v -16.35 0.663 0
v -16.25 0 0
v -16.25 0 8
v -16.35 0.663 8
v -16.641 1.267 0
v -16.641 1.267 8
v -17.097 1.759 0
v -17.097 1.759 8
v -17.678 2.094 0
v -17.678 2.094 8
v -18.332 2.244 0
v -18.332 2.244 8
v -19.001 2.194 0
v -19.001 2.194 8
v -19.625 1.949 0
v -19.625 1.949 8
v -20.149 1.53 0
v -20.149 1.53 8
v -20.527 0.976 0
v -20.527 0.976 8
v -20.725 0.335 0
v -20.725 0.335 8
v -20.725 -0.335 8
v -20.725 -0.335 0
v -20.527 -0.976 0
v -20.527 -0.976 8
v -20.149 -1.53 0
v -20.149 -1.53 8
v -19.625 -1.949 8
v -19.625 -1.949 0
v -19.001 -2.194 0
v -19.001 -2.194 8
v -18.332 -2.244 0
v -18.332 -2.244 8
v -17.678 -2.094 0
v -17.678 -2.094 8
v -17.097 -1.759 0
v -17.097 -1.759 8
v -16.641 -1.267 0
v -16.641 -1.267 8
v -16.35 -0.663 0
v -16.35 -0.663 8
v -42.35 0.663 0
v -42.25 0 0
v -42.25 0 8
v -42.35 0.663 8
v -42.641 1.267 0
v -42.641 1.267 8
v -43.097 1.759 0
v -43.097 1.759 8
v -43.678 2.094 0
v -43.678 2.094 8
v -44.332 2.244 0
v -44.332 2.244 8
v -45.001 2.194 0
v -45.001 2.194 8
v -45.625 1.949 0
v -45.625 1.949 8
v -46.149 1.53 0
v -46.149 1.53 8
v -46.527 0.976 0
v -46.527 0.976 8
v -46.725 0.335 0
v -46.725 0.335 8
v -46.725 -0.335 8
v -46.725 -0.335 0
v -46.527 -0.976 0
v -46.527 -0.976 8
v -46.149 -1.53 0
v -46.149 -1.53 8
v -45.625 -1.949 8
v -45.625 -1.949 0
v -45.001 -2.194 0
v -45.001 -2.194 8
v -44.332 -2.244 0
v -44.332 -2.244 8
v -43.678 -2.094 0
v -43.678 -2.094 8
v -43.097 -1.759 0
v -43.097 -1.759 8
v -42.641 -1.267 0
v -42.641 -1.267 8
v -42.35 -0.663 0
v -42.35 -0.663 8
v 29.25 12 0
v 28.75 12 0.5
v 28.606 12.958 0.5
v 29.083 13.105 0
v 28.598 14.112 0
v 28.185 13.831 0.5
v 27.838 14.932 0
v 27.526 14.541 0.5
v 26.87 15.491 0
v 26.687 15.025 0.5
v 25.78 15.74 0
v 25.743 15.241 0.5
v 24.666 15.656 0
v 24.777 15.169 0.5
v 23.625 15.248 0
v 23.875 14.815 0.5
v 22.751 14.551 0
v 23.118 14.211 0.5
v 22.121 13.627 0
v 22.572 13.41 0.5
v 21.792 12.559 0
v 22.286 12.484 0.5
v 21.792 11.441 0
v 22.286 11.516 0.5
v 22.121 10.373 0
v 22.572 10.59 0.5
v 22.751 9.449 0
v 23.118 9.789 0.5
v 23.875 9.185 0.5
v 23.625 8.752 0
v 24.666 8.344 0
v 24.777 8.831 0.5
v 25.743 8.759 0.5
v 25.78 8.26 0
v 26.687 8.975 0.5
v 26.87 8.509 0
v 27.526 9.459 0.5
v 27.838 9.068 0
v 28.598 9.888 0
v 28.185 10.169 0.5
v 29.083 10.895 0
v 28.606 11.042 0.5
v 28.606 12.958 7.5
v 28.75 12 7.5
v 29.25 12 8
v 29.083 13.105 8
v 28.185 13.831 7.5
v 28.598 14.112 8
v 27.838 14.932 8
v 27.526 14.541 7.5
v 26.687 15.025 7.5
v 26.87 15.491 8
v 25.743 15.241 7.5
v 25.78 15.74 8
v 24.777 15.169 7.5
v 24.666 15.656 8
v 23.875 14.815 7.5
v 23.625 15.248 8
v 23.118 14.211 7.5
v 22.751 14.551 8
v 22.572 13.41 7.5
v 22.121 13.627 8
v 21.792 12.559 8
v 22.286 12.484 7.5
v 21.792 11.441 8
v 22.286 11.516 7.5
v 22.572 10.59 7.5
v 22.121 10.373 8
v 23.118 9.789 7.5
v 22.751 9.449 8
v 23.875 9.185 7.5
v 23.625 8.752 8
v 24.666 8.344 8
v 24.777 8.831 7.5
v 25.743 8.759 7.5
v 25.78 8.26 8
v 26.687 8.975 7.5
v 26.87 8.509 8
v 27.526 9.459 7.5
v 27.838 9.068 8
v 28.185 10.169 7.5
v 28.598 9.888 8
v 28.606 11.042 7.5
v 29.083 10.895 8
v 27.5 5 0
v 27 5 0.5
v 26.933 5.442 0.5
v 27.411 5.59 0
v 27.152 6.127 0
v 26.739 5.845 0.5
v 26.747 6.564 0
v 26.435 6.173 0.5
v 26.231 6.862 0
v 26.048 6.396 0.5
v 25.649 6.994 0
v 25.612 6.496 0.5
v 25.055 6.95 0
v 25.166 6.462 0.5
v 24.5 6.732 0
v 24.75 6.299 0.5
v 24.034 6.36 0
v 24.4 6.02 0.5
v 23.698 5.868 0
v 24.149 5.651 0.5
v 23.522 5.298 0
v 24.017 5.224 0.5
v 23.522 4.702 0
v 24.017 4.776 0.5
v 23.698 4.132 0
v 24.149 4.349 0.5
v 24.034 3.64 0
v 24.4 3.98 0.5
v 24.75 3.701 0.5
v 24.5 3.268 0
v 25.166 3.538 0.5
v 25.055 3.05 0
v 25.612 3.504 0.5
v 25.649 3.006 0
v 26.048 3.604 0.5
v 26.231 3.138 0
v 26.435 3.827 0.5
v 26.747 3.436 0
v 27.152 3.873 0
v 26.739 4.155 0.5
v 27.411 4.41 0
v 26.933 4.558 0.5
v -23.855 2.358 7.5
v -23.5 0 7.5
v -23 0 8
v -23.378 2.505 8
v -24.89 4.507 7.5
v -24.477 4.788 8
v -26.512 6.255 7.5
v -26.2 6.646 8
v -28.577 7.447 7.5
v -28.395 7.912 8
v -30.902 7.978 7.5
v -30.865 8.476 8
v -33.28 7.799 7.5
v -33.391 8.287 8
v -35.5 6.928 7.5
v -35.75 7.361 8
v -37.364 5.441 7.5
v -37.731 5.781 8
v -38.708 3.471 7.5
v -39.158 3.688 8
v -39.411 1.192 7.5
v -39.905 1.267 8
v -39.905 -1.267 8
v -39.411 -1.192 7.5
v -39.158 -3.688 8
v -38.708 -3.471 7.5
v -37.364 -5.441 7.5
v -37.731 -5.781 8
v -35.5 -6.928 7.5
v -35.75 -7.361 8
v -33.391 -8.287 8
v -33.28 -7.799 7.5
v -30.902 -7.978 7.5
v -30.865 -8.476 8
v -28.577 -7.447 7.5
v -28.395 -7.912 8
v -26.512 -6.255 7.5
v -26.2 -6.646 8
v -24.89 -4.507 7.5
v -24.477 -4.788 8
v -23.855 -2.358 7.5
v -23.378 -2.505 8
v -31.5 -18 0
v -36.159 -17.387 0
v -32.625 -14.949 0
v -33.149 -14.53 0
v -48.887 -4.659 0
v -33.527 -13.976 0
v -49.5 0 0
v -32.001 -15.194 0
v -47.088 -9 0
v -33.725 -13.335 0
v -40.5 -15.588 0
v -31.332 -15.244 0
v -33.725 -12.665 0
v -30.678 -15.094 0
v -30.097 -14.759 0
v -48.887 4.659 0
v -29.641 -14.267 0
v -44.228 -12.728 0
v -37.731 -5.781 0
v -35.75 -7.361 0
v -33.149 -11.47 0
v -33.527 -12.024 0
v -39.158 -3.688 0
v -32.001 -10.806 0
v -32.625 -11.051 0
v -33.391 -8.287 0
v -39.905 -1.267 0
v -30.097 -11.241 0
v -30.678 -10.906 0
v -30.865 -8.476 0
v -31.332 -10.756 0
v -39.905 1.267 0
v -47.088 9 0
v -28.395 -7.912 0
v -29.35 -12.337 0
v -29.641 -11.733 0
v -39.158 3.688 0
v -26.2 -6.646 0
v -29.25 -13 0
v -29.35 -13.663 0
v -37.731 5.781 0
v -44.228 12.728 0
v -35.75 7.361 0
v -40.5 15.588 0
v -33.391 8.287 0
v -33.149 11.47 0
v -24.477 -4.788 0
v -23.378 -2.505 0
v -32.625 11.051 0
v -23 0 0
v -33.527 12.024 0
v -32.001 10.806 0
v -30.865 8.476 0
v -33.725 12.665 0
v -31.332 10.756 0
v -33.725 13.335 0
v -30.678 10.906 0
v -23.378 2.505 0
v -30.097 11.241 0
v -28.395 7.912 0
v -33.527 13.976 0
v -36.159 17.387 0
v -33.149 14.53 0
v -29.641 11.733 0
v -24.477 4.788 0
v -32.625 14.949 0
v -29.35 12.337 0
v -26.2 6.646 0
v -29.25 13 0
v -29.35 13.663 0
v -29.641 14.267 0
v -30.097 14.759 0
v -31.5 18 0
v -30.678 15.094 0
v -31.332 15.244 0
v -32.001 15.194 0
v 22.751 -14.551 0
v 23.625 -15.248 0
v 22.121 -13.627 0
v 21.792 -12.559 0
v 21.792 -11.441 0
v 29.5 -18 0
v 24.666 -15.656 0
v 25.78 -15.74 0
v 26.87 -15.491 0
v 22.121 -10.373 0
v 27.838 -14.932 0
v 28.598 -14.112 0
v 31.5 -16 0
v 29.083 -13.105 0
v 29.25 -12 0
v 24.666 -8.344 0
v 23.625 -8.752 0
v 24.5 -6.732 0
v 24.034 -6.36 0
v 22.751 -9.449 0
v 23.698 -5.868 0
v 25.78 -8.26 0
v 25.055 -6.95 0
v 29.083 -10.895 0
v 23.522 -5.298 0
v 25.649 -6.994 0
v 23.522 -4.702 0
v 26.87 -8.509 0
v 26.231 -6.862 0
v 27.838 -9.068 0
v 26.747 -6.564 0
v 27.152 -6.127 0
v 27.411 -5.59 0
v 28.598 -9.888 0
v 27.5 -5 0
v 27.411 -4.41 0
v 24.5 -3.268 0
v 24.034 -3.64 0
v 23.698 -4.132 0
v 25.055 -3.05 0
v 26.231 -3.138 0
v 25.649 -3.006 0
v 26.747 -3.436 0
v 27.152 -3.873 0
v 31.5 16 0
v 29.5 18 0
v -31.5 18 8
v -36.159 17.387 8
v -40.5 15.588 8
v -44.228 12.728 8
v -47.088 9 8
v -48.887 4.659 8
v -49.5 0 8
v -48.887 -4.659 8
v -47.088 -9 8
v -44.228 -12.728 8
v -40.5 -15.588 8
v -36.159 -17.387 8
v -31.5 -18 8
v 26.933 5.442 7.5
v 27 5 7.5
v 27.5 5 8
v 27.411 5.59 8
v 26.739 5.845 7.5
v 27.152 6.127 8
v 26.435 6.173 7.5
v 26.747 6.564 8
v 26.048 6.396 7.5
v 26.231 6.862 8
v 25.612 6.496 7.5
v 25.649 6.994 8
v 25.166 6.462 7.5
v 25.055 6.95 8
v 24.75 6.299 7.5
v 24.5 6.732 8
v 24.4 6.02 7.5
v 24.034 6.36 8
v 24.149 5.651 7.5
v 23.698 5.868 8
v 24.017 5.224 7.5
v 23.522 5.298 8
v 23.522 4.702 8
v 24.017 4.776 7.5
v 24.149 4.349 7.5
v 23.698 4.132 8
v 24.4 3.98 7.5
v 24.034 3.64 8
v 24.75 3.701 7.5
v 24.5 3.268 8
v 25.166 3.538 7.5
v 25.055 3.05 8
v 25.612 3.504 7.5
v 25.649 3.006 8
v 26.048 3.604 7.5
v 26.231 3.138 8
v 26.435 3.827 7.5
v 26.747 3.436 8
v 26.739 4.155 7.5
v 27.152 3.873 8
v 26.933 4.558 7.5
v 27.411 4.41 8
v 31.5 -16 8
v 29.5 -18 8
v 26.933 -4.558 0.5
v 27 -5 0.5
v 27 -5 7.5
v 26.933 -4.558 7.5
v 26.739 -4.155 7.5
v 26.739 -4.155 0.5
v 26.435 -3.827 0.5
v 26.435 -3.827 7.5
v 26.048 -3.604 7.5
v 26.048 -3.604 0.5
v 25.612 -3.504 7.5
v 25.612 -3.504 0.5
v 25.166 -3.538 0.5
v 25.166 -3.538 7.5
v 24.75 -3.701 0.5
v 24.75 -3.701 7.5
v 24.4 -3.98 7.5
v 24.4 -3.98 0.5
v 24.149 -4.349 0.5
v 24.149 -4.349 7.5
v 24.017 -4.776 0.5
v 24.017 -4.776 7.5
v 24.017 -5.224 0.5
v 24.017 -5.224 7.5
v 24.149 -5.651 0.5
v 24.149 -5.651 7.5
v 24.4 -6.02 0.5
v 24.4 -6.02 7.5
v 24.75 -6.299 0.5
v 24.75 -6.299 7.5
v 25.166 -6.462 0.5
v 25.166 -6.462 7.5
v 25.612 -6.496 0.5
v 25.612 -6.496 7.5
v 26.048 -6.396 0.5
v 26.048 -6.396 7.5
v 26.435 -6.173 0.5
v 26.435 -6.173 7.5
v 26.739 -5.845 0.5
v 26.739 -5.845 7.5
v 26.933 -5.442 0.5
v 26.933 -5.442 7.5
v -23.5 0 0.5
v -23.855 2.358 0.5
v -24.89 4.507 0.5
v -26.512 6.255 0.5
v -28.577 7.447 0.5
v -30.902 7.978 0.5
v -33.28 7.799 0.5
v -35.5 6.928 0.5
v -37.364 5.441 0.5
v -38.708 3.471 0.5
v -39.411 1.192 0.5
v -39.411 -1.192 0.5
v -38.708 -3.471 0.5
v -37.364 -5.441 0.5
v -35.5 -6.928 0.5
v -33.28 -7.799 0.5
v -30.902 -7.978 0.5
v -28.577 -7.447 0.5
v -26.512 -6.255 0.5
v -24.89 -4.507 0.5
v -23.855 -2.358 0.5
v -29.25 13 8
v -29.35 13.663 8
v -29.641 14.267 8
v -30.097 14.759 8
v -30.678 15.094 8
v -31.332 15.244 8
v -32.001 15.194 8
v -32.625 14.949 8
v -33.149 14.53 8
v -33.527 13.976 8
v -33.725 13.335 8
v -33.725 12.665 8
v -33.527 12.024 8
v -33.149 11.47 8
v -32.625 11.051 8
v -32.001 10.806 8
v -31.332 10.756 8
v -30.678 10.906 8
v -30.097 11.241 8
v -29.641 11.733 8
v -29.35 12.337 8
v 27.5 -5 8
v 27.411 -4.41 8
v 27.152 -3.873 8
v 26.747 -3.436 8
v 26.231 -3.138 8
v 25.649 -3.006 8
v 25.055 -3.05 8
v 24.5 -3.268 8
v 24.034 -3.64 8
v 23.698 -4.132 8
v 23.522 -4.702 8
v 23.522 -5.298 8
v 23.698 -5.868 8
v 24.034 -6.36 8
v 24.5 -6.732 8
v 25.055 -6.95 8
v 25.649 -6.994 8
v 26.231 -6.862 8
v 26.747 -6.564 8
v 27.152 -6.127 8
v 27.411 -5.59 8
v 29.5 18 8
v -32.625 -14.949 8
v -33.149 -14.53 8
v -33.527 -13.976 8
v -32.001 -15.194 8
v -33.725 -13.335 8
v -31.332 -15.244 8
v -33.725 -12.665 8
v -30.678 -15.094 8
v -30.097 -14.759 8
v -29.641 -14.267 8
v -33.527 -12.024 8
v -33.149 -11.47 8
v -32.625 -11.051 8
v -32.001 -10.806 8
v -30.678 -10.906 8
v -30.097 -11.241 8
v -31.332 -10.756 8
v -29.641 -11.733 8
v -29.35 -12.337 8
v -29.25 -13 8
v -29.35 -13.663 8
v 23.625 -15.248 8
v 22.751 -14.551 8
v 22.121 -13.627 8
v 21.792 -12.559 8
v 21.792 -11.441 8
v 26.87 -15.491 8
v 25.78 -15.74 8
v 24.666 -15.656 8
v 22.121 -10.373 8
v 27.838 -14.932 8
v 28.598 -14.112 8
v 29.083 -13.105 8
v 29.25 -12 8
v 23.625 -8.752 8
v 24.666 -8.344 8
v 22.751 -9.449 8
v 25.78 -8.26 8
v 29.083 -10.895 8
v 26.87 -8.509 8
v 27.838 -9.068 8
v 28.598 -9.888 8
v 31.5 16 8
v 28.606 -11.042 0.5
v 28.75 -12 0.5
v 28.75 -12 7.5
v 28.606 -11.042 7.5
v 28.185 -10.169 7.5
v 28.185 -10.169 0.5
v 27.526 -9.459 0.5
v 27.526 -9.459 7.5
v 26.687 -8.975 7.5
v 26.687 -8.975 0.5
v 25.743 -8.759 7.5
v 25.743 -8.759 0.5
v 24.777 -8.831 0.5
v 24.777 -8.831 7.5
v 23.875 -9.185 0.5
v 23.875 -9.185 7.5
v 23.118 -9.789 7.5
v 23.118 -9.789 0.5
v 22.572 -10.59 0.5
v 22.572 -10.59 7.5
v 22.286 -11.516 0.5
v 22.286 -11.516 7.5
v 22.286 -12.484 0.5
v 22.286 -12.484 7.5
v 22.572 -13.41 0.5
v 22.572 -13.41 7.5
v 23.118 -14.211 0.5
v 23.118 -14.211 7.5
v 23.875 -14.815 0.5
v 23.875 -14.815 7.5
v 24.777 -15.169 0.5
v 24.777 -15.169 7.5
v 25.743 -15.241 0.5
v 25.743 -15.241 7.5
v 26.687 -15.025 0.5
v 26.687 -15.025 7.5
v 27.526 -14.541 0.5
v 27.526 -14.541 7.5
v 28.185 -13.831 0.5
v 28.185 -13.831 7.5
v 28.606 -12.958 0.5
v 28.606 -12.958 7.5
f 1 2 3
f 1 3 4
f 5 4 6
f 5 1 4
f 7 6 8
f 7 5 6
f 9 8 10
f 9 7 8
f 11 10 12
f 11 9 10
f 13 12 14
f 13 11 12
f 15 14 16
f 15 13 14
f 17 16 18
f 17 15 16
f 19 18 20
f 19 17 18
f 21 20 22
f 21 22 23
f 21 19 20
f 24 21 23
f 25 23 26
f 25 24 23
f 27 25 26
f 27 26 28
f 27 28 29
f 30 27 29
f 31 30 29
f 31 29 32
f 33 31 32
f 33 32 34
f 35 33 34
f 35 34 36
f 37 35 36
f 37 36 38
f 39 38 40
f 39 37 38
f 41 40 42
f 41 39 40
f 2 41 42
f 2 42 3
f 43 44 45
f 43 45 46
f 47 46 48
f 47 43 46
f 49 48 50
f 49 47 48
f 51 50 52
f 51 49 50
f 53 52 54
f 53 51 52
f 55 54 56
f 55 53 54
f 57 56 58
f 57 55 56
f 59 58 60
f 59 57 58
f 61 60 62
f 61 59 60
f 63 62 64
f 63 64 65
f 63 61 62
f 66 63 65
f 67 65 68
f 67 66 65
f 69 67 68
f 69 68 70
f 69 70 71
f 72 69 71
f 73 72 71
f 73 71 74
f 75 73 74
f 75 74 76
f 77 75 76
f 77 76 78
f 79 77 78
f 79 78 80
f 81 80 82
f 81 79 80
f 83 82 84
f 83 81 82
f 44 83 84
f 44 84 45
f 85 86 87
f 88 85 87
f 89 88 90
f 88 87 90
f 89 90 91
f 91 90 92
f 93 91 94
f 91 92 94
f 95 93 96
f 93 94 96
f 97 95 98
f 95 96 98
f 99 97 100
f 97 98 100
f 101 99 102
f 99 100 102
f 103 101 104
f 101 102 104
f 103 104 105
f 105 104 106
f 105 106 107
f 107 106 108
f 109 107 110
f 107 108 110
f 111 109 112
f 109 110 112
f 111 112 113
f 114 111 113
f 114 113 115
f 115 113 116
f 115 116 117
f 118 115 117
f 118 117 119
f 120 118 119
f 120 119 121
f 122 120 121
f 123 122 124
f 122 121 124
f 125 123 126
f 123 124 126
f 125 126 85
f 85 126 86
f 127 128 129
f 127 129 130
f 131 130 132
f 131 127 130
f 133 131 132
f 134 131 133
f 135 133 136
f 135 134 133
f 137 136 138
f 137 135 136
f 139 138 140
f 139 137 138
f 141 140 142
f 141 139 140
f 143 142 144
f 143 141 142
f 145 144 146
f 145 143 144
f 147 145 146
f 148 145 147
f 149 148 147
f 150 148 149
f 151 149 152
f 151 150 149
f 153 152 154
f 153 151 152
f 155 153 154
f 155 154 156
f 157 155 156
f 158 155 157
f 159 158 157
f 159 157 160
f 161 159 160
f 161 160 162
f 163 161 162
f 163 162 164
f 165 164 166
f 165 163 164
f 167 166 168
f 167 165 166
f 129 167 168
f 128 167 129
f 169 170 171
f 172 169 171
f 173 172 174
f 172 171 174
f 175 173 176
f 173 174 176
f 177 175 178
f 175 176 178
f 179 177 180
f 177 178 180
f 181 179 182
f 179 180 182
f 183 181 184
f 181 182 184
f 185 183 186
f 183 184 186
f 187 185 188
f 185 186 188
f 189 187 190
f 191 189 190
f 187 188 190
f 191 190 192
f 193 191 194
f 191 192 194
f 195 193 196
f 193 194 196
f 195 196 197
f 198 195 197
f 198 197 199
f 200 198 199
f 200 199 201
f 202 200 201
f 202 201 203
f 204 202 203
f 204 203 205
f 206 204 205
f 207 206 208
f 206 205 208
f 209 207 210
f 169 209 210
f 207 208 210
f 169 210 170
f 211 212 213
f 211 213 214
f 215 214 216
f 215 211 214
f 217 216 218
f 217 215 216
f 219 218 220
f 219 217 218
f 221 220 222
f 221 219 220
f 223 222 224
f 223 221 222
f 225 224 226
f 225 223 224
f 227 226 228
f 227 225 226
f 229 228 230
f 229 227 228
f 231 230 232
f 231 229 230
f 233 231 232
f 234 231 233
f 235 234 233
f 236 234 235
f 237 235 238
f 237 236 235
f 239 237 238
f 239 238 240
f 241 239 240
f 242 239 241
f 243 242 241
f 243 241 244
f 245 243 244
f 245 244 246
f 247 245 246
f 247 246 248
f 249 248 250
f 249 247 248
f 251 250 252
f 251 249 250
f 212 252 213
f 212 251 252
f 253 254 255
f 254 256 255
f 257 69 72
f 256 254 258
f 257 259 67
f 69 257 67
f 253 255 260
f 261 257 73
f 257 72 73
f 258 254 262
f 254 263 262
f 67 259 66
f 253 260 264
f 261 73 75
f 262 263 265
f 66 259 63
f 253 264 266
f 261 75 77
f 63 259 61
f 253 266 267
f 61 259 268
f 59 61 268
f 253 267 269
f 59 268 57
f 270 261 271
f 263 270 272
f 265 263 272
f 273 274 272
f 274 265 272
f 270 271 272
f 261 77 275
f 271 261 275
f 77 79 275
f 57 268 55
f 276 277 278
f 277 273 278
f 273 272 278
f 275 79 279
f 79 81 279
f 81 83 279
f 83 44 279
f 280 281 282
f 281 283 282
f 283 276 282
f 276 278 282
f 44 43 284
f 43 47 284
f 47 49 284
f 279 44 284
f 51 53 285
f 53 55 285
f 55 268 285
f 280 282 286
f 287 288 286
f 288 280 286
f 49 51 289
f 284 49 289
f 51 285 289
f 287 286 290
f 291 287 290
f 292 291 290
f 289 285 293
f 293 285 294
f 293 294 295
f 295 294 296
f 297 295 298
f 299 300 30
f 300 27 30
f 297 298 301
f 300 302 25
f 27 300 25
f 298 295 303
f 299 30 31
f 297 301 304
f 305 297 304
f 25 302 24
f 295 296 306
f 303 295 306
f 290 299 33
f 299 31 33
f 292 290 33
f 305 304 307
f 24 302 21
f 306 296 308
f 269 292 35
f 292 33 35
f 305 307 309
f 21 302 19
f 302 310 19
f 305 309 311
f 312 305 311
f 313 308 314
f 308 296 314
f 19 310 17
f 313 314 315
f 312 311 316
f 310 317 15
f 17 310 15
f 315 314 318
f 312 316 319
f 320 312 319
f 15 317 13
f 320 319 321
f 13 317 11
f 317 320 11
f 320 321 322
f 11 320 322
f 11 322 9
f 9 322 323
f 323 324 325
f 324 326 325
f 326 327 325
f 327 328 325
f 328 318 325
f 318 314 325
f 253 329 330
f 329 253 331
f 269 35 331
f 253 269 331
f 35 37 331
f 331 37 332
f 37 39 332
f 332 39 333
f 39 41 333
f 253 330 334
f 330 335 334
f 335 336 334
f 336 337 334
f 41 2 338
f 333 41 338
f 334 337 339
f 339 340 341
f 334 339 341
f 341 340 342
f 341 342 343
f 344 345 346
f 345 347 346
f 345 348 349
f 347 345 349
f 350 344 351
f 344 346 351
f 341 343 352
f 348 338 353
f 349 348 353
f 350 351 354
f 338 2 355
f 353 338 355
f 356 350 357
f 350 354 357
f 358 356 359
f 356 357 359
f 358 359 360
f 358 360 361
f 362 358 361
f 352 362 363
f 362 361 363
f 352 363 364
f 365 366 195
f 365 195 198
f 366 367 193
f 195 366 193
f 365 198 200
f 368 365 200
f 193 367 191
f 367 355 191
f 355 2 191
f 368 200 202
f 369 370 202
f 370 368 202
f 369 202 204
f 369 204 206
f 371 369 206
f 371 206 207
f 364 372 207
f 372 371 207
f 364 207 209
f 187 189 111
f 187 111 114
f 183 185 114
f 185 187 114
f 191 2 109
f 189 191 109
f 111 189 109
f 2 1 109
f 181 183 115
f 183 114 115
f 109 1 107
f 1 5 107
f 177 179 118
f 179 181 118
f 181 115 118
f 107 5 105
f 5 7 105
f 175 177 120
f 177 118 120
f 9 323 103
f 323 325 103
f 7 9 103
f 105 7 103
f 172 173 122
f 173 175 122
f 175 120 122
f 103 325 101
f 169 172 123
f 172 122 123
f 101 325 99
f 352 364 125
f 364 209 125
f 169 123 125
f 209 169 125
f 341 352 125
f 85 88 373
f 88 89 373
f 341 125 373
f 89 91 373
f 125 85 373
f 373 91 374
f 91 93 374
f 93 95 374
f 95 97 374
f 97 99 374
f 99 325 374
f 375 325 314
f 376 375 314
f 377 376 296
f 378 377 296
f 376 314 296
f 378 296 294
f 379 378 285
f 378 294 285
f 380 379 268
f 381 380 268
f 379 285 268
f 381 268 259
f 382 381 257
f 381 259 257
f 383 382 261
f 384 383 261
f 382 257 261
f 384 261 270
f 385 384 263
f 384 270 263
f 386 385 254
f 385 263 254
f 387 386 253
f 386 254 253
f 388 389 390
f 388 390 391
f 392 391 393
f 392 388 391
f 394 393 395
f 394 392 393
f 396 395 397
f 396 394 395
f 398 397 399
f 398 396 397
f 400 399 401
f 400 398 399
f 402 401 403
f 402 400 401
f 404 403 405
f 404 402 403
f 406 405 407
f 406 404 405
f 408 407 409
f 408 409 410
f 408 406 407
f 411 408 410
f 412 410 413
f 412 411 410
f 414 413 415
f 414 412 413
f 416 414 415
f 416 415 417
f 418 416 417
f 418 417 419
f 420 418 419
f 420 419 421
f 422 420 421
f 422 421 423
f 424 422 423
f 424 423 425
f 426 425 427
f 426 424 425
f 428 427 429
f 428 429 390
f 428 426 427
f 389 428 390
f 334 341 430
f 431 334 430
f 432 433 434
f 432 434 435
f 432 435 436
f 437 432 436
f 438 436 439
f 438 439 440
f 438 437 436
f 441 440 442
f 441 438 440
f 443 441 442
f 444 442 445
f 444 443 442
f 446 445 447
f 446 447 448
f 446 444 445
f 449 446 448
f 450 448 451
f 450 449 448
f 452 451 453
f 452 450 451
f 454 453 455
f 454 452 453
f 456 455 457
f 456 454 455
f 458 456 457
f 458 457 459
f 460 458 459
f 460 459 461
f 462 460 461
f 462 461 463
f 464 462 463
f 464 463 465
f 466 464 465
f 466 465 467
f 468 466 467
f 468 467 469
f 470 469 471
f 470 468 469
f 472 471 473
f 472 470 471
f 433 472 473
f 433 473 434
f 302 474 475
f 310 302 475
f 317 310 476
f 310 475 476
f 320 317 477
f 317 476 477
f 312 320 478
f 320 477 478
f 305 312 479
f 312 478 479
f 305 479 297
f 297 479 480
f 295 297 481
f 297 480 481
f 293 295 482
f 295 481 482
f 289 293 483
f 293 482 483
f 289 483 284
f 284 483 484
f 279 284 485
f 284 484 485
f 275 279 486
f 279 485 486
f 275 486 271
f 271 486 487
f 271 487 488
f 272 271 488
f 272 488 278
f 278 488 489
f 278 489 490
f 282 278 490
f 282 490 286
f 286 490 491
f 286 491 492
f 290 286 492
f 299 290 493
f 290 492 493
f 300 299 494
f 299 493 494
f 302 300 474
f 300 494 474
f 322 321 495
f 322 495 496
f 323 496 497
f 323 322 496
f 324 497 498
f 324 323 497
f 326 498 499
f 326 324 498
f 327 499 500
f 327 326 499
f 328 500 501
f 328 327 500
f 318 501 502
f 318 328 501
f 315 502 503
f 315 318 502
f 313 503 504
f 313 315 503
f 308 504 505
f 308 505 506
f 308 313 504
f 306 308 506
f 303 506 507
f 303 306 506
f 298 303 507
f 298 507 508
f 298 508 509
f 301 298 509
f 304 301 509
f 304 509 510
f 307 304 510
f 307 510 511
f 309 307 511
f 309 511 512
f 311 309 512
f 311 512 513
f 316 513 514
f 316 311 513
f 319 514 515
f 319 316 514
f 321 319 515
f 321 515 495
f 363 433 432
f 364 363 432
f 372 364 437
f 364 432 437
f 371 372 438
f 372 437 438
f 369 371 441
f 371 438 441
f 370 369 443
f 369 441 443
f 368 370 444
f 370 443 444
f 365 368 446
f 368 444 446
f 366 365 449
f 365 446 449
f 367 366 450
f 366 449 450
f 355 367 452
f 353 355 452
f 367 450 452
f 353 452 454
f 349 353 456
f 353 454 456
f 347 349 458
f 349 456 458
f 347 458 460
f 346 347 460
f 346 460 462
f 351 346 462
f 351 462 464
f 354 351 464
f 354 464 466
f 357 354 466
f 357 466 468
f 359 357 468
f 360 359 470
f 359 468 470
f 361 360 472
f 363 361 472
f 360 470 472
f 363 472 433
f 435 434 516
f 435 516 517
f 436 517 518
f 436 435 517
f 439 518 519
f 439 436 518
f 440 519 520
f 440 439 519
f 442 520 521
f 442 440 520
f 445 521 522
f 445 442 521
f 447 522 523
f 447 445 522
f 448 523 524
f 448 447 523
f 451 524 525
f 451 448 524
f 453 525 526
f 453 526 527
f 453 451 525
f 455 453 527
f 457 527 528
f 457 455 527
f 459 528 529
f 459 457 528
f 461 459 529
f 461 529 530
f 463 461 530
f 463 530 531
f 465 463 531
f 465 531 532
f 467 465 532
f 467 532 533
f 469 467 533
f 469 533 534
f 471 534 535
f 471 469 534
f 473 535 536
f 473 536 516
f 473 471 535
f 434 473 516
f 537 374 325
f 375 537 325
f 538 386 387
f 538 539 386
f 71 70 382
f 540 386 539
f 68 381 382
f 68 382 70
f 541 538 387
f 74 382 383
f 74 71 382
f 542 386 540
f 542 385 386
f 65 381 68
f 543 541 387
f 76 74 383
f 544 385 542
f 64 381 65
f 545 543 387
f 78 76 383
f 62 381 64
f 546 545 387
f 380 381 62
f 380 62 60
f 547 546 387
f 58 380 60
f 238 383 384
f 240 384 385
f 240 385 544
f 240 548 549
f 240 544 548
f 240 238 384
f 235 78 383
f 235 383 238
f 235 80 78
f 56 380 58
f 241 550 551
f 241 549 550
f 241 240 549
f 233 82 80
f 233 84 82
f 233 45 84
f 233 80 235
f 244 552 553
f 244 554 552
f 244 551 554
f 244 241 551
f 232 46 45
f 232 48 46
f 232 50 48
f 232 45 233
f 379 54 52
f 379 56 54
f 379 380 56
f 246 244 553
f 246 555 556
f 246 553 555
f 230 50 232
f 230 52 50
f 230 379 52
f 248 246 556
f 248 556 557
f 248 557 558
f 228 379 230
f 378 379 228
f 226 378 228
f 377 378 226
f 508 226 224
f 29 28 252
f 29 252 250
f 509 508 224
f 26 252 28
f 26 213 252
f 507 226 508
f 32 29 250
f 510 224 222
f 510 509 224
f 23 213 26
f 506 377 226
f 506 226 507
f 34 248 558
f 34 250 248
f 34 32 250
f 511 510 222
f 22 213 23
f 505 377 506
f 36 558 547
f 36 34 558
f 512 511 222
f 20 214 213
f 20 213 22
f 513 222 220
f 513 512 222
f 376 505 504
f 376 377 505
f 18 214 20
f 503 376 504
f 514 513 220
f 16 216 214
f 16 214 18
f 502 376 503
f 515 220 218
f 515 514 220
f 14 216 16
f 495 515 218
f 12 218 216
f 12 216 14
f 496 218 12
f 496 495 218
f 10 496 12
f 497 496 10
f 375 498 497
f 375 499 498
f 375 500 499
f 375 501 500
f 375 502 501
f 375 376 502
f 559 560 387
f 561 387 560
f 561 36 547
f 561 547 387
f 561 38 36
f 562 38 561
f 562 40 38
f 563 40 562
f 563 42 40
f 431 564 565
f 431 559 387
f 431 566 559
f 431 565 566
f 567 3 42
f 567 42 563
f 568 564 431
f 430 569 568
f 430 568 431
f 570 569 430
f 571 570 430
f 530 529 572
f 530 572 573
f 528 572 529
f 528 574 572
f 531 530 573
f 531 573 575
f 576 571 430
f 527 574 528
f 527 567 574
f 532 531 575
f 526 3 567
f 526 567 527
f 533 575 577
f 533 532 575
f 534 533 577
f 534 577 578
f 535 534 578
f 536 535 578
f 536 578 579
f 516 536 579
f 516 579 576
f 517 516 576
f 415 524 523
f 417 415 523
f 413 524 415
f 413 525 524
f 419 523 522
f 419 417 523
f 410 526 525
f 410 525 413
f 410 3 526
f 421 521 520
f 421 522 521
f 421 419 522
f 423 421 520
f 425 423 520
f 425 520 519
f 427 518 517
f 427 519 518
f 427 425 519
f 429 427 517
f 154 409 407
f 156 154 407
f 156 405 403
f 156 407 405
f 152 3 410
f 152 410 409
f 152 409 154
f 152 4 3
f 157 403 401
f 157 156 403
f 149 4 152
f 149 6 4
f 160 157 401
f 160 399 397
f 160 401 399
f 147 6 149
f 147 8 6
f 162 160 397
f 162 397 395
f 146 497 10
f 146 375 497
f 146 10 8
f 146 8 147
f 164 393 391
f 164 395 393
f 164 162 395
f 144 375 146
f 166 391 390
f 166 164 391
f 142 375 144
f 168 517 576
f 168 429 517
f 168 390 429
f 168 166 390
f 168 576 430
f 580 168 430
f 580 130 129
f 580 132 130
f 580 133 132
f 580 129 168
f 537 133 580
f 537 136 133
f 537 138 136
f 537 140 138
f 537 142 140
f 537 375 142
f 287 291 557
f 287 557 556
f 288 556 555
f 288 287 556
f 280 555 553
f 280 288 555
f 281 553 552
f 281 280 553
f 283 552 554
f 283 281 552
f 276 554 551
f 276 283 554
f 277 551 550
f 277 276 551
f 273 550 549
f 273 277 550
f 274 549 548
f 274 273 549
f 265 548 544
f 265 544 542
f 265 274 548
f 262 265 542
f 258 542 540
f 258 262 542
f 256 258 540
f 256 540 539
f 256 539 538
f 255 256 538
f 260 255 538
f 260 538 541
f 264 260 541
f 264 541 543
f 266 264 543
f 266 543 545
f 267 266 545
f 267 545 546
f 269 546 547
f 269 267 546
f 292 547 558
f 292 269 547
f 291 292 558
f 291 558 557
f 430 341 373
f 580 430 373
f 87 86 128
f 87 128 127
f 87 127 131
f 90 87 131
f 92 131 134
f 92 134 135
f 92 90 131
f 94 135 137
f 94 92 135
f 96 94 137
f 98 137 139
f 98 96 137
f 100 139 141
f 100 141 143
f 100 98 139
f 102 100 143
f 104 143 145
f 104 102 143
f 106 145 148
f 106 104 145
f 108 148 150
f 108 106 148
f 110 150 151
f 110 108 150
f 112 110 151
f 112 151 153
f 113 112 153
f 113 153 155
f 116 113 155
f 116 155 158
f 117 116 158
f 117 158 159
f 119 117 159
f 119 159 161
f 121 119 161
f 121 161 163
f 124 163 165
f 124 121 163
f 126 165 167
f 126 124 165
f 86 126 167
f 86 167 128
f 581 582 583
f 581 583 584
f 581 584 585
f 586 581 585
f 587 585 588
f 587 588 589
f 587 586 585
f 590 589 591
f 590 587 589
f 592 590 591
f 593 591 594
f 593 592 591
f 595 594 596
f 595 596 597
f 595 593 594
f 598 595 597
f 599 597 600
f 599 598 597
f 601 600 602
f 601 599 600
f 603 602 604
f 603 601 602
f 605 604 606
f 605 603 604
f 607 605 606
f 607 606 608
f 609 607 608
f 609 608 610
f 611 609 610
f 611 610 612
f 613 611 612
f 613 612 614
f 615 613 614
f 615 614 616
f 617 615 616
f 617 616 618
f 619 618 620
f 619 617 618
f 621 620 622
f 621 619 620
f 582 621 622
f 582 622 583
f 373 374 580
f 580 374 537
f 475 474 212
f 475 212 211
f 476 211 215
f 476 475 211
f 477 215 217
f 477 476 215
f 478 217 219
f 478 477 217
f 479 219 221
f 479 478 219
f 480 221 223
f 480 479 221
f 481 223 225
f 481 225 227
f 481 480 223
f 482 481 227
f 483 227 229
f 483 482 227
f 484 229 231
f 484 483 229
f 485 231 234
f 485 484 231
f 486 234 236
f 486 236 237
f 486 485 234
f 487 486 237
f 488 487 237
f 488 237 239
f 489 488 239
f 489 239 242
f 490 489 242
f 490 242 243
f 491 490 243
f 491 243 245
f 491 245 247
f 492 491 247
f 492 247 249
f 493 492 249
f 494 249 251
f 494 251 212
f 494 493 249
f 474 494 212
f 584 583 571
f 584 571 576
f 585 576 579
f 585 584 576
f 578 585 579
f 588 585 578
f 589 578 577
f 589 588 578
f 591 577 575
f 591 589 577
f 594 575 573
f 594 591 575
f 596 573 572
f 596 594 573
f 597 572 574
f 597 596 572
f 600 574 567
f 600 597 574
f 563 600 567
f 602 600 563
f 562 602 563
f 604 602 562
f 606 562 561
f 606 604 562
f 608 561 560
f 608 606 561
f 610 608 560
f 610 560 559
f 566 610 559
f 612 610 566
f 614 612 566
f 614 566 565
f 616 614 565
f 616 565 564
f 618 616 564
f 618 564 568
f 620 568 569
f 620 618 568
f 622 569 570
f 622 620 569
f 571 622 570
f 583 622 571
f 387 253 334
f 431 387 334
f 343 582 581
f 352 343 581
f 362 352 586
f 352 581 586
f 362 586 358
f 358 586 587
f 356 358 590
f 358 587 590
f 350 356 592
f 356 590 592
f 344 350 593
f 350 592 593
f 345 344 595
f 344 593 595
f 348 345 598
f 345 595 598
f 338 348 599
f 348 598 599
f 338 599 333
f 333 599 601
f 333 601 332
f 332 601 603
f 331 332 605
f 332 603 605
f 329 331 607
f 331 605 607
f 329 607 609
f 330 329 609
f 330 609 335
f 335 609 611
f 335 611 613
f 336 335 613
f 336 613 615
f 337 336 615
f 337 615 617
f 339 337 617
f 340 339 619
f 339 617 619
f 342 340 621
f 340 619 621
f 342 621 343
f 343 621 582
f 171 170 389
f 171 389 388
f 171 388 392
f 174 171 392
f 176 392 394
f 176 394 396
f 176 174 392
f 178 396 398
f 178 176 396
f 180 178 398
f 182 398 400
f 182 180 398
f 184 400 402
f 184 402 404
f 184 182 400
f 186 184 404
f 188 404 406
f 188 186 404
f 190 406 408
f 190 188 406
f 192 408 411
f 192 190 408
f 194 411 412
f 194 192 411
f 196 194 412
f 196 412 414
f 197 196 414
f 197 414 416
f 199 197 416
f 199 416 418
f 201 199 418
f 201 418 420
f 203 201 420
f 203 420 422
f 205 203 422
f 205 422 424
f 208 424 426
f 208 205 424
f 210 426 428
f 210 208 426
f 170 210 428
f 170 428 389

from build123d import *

# Parameters (mm, degrees)
SKETCH1_R           = 8
SKETCH1_R_2         = 2.25
SKETCH1_R_3         = 3.25
SKETCH1_R_4         = 1.5
BOSS_EXTRUDE1_DEPTH = 8
CHAMFER2_SIZE       = 2
CHAMFER3_SIZE       = 0.5


with BuildPart() as part:
    # Sketch1 → Boss-Extrude1 (new body)
    with BuildSketch(Plane.XY):
        with BuildLine():
            Line((-31.5, -18), (31.5, -18))
            Line((31.5, -18), (31.5, 18))
            Line((31.5, 18), (-31.5, 18))
            ThreePointArc((-31.5, 18), (-49.5, 0), (-31.5, -18))
        make_face()
        with Locations((-31.5, 0)):
            Circle(SKETCH1_R, mode=Mode.SUBTRACT)
        with Locations((-31.5, 13)):
            Circle(SKETCH1_R_2, mode=Mode.SUBTRACT)
        with Locations((-18.5, 0)):
            Circle(SKETCH1_R_2, mode=Mode.SUBTRACT)
        with Locations((-31.5, -13)):
            Circle(SKETCH1_R_2, mode=Mode.SUBTRACT)
        with Locations((-44.5, 0)):
            Circle(SKETCH1_R_2, mode=Mode.SUBTRACT)
        with Locations((25.5, 12)):
            Circle(SKETCH1_R_3, mode=Mode.SUBTRACT)
        with Locations((25.5, 5)):
            Circle(SKETCH1_R_4, mode=Mode.SUBTRACT)
        with Locations((25.5, -5)):
            Circle(SKETCH1_R_4, mode=Mode.SUBTRACT)
        with Locations((25.5, -12)):
            Circle(SKETCH1_R_3, mode=Mode.SUBTRACT)
    extrude(amount=BOSS_EXTRUDE1_DEPTH)

    # Chamfer2
    chamfer2_edges = [part.edges().sort_by_distance(p)[0] for p in [
        (31.5, 18, 4),
        (31.5, -18, 4),
    ]]
    chamfer(chamfer2_edges, length=CHAMFER2_SIZE)

    # Chamfer3
    chamfer3_edges = [part.edges().sort_by_distance(p)[0] for p in [
        (-39.5, 0, 8),
        (22.25, -12, 0),
        (22.25, 12, 0),
        (24, 5, 0),
        (24, -5, 0),
        (-39.5, 0, 0),
        (24, -5, 8),
        (24, 5, 8),
        (22.25, 12, 8),
        (22.25, -12, 8),
    ]]
    chamfer(chamfer3_edges, length=CHAMFER3_SIZE)


solid = part.part
